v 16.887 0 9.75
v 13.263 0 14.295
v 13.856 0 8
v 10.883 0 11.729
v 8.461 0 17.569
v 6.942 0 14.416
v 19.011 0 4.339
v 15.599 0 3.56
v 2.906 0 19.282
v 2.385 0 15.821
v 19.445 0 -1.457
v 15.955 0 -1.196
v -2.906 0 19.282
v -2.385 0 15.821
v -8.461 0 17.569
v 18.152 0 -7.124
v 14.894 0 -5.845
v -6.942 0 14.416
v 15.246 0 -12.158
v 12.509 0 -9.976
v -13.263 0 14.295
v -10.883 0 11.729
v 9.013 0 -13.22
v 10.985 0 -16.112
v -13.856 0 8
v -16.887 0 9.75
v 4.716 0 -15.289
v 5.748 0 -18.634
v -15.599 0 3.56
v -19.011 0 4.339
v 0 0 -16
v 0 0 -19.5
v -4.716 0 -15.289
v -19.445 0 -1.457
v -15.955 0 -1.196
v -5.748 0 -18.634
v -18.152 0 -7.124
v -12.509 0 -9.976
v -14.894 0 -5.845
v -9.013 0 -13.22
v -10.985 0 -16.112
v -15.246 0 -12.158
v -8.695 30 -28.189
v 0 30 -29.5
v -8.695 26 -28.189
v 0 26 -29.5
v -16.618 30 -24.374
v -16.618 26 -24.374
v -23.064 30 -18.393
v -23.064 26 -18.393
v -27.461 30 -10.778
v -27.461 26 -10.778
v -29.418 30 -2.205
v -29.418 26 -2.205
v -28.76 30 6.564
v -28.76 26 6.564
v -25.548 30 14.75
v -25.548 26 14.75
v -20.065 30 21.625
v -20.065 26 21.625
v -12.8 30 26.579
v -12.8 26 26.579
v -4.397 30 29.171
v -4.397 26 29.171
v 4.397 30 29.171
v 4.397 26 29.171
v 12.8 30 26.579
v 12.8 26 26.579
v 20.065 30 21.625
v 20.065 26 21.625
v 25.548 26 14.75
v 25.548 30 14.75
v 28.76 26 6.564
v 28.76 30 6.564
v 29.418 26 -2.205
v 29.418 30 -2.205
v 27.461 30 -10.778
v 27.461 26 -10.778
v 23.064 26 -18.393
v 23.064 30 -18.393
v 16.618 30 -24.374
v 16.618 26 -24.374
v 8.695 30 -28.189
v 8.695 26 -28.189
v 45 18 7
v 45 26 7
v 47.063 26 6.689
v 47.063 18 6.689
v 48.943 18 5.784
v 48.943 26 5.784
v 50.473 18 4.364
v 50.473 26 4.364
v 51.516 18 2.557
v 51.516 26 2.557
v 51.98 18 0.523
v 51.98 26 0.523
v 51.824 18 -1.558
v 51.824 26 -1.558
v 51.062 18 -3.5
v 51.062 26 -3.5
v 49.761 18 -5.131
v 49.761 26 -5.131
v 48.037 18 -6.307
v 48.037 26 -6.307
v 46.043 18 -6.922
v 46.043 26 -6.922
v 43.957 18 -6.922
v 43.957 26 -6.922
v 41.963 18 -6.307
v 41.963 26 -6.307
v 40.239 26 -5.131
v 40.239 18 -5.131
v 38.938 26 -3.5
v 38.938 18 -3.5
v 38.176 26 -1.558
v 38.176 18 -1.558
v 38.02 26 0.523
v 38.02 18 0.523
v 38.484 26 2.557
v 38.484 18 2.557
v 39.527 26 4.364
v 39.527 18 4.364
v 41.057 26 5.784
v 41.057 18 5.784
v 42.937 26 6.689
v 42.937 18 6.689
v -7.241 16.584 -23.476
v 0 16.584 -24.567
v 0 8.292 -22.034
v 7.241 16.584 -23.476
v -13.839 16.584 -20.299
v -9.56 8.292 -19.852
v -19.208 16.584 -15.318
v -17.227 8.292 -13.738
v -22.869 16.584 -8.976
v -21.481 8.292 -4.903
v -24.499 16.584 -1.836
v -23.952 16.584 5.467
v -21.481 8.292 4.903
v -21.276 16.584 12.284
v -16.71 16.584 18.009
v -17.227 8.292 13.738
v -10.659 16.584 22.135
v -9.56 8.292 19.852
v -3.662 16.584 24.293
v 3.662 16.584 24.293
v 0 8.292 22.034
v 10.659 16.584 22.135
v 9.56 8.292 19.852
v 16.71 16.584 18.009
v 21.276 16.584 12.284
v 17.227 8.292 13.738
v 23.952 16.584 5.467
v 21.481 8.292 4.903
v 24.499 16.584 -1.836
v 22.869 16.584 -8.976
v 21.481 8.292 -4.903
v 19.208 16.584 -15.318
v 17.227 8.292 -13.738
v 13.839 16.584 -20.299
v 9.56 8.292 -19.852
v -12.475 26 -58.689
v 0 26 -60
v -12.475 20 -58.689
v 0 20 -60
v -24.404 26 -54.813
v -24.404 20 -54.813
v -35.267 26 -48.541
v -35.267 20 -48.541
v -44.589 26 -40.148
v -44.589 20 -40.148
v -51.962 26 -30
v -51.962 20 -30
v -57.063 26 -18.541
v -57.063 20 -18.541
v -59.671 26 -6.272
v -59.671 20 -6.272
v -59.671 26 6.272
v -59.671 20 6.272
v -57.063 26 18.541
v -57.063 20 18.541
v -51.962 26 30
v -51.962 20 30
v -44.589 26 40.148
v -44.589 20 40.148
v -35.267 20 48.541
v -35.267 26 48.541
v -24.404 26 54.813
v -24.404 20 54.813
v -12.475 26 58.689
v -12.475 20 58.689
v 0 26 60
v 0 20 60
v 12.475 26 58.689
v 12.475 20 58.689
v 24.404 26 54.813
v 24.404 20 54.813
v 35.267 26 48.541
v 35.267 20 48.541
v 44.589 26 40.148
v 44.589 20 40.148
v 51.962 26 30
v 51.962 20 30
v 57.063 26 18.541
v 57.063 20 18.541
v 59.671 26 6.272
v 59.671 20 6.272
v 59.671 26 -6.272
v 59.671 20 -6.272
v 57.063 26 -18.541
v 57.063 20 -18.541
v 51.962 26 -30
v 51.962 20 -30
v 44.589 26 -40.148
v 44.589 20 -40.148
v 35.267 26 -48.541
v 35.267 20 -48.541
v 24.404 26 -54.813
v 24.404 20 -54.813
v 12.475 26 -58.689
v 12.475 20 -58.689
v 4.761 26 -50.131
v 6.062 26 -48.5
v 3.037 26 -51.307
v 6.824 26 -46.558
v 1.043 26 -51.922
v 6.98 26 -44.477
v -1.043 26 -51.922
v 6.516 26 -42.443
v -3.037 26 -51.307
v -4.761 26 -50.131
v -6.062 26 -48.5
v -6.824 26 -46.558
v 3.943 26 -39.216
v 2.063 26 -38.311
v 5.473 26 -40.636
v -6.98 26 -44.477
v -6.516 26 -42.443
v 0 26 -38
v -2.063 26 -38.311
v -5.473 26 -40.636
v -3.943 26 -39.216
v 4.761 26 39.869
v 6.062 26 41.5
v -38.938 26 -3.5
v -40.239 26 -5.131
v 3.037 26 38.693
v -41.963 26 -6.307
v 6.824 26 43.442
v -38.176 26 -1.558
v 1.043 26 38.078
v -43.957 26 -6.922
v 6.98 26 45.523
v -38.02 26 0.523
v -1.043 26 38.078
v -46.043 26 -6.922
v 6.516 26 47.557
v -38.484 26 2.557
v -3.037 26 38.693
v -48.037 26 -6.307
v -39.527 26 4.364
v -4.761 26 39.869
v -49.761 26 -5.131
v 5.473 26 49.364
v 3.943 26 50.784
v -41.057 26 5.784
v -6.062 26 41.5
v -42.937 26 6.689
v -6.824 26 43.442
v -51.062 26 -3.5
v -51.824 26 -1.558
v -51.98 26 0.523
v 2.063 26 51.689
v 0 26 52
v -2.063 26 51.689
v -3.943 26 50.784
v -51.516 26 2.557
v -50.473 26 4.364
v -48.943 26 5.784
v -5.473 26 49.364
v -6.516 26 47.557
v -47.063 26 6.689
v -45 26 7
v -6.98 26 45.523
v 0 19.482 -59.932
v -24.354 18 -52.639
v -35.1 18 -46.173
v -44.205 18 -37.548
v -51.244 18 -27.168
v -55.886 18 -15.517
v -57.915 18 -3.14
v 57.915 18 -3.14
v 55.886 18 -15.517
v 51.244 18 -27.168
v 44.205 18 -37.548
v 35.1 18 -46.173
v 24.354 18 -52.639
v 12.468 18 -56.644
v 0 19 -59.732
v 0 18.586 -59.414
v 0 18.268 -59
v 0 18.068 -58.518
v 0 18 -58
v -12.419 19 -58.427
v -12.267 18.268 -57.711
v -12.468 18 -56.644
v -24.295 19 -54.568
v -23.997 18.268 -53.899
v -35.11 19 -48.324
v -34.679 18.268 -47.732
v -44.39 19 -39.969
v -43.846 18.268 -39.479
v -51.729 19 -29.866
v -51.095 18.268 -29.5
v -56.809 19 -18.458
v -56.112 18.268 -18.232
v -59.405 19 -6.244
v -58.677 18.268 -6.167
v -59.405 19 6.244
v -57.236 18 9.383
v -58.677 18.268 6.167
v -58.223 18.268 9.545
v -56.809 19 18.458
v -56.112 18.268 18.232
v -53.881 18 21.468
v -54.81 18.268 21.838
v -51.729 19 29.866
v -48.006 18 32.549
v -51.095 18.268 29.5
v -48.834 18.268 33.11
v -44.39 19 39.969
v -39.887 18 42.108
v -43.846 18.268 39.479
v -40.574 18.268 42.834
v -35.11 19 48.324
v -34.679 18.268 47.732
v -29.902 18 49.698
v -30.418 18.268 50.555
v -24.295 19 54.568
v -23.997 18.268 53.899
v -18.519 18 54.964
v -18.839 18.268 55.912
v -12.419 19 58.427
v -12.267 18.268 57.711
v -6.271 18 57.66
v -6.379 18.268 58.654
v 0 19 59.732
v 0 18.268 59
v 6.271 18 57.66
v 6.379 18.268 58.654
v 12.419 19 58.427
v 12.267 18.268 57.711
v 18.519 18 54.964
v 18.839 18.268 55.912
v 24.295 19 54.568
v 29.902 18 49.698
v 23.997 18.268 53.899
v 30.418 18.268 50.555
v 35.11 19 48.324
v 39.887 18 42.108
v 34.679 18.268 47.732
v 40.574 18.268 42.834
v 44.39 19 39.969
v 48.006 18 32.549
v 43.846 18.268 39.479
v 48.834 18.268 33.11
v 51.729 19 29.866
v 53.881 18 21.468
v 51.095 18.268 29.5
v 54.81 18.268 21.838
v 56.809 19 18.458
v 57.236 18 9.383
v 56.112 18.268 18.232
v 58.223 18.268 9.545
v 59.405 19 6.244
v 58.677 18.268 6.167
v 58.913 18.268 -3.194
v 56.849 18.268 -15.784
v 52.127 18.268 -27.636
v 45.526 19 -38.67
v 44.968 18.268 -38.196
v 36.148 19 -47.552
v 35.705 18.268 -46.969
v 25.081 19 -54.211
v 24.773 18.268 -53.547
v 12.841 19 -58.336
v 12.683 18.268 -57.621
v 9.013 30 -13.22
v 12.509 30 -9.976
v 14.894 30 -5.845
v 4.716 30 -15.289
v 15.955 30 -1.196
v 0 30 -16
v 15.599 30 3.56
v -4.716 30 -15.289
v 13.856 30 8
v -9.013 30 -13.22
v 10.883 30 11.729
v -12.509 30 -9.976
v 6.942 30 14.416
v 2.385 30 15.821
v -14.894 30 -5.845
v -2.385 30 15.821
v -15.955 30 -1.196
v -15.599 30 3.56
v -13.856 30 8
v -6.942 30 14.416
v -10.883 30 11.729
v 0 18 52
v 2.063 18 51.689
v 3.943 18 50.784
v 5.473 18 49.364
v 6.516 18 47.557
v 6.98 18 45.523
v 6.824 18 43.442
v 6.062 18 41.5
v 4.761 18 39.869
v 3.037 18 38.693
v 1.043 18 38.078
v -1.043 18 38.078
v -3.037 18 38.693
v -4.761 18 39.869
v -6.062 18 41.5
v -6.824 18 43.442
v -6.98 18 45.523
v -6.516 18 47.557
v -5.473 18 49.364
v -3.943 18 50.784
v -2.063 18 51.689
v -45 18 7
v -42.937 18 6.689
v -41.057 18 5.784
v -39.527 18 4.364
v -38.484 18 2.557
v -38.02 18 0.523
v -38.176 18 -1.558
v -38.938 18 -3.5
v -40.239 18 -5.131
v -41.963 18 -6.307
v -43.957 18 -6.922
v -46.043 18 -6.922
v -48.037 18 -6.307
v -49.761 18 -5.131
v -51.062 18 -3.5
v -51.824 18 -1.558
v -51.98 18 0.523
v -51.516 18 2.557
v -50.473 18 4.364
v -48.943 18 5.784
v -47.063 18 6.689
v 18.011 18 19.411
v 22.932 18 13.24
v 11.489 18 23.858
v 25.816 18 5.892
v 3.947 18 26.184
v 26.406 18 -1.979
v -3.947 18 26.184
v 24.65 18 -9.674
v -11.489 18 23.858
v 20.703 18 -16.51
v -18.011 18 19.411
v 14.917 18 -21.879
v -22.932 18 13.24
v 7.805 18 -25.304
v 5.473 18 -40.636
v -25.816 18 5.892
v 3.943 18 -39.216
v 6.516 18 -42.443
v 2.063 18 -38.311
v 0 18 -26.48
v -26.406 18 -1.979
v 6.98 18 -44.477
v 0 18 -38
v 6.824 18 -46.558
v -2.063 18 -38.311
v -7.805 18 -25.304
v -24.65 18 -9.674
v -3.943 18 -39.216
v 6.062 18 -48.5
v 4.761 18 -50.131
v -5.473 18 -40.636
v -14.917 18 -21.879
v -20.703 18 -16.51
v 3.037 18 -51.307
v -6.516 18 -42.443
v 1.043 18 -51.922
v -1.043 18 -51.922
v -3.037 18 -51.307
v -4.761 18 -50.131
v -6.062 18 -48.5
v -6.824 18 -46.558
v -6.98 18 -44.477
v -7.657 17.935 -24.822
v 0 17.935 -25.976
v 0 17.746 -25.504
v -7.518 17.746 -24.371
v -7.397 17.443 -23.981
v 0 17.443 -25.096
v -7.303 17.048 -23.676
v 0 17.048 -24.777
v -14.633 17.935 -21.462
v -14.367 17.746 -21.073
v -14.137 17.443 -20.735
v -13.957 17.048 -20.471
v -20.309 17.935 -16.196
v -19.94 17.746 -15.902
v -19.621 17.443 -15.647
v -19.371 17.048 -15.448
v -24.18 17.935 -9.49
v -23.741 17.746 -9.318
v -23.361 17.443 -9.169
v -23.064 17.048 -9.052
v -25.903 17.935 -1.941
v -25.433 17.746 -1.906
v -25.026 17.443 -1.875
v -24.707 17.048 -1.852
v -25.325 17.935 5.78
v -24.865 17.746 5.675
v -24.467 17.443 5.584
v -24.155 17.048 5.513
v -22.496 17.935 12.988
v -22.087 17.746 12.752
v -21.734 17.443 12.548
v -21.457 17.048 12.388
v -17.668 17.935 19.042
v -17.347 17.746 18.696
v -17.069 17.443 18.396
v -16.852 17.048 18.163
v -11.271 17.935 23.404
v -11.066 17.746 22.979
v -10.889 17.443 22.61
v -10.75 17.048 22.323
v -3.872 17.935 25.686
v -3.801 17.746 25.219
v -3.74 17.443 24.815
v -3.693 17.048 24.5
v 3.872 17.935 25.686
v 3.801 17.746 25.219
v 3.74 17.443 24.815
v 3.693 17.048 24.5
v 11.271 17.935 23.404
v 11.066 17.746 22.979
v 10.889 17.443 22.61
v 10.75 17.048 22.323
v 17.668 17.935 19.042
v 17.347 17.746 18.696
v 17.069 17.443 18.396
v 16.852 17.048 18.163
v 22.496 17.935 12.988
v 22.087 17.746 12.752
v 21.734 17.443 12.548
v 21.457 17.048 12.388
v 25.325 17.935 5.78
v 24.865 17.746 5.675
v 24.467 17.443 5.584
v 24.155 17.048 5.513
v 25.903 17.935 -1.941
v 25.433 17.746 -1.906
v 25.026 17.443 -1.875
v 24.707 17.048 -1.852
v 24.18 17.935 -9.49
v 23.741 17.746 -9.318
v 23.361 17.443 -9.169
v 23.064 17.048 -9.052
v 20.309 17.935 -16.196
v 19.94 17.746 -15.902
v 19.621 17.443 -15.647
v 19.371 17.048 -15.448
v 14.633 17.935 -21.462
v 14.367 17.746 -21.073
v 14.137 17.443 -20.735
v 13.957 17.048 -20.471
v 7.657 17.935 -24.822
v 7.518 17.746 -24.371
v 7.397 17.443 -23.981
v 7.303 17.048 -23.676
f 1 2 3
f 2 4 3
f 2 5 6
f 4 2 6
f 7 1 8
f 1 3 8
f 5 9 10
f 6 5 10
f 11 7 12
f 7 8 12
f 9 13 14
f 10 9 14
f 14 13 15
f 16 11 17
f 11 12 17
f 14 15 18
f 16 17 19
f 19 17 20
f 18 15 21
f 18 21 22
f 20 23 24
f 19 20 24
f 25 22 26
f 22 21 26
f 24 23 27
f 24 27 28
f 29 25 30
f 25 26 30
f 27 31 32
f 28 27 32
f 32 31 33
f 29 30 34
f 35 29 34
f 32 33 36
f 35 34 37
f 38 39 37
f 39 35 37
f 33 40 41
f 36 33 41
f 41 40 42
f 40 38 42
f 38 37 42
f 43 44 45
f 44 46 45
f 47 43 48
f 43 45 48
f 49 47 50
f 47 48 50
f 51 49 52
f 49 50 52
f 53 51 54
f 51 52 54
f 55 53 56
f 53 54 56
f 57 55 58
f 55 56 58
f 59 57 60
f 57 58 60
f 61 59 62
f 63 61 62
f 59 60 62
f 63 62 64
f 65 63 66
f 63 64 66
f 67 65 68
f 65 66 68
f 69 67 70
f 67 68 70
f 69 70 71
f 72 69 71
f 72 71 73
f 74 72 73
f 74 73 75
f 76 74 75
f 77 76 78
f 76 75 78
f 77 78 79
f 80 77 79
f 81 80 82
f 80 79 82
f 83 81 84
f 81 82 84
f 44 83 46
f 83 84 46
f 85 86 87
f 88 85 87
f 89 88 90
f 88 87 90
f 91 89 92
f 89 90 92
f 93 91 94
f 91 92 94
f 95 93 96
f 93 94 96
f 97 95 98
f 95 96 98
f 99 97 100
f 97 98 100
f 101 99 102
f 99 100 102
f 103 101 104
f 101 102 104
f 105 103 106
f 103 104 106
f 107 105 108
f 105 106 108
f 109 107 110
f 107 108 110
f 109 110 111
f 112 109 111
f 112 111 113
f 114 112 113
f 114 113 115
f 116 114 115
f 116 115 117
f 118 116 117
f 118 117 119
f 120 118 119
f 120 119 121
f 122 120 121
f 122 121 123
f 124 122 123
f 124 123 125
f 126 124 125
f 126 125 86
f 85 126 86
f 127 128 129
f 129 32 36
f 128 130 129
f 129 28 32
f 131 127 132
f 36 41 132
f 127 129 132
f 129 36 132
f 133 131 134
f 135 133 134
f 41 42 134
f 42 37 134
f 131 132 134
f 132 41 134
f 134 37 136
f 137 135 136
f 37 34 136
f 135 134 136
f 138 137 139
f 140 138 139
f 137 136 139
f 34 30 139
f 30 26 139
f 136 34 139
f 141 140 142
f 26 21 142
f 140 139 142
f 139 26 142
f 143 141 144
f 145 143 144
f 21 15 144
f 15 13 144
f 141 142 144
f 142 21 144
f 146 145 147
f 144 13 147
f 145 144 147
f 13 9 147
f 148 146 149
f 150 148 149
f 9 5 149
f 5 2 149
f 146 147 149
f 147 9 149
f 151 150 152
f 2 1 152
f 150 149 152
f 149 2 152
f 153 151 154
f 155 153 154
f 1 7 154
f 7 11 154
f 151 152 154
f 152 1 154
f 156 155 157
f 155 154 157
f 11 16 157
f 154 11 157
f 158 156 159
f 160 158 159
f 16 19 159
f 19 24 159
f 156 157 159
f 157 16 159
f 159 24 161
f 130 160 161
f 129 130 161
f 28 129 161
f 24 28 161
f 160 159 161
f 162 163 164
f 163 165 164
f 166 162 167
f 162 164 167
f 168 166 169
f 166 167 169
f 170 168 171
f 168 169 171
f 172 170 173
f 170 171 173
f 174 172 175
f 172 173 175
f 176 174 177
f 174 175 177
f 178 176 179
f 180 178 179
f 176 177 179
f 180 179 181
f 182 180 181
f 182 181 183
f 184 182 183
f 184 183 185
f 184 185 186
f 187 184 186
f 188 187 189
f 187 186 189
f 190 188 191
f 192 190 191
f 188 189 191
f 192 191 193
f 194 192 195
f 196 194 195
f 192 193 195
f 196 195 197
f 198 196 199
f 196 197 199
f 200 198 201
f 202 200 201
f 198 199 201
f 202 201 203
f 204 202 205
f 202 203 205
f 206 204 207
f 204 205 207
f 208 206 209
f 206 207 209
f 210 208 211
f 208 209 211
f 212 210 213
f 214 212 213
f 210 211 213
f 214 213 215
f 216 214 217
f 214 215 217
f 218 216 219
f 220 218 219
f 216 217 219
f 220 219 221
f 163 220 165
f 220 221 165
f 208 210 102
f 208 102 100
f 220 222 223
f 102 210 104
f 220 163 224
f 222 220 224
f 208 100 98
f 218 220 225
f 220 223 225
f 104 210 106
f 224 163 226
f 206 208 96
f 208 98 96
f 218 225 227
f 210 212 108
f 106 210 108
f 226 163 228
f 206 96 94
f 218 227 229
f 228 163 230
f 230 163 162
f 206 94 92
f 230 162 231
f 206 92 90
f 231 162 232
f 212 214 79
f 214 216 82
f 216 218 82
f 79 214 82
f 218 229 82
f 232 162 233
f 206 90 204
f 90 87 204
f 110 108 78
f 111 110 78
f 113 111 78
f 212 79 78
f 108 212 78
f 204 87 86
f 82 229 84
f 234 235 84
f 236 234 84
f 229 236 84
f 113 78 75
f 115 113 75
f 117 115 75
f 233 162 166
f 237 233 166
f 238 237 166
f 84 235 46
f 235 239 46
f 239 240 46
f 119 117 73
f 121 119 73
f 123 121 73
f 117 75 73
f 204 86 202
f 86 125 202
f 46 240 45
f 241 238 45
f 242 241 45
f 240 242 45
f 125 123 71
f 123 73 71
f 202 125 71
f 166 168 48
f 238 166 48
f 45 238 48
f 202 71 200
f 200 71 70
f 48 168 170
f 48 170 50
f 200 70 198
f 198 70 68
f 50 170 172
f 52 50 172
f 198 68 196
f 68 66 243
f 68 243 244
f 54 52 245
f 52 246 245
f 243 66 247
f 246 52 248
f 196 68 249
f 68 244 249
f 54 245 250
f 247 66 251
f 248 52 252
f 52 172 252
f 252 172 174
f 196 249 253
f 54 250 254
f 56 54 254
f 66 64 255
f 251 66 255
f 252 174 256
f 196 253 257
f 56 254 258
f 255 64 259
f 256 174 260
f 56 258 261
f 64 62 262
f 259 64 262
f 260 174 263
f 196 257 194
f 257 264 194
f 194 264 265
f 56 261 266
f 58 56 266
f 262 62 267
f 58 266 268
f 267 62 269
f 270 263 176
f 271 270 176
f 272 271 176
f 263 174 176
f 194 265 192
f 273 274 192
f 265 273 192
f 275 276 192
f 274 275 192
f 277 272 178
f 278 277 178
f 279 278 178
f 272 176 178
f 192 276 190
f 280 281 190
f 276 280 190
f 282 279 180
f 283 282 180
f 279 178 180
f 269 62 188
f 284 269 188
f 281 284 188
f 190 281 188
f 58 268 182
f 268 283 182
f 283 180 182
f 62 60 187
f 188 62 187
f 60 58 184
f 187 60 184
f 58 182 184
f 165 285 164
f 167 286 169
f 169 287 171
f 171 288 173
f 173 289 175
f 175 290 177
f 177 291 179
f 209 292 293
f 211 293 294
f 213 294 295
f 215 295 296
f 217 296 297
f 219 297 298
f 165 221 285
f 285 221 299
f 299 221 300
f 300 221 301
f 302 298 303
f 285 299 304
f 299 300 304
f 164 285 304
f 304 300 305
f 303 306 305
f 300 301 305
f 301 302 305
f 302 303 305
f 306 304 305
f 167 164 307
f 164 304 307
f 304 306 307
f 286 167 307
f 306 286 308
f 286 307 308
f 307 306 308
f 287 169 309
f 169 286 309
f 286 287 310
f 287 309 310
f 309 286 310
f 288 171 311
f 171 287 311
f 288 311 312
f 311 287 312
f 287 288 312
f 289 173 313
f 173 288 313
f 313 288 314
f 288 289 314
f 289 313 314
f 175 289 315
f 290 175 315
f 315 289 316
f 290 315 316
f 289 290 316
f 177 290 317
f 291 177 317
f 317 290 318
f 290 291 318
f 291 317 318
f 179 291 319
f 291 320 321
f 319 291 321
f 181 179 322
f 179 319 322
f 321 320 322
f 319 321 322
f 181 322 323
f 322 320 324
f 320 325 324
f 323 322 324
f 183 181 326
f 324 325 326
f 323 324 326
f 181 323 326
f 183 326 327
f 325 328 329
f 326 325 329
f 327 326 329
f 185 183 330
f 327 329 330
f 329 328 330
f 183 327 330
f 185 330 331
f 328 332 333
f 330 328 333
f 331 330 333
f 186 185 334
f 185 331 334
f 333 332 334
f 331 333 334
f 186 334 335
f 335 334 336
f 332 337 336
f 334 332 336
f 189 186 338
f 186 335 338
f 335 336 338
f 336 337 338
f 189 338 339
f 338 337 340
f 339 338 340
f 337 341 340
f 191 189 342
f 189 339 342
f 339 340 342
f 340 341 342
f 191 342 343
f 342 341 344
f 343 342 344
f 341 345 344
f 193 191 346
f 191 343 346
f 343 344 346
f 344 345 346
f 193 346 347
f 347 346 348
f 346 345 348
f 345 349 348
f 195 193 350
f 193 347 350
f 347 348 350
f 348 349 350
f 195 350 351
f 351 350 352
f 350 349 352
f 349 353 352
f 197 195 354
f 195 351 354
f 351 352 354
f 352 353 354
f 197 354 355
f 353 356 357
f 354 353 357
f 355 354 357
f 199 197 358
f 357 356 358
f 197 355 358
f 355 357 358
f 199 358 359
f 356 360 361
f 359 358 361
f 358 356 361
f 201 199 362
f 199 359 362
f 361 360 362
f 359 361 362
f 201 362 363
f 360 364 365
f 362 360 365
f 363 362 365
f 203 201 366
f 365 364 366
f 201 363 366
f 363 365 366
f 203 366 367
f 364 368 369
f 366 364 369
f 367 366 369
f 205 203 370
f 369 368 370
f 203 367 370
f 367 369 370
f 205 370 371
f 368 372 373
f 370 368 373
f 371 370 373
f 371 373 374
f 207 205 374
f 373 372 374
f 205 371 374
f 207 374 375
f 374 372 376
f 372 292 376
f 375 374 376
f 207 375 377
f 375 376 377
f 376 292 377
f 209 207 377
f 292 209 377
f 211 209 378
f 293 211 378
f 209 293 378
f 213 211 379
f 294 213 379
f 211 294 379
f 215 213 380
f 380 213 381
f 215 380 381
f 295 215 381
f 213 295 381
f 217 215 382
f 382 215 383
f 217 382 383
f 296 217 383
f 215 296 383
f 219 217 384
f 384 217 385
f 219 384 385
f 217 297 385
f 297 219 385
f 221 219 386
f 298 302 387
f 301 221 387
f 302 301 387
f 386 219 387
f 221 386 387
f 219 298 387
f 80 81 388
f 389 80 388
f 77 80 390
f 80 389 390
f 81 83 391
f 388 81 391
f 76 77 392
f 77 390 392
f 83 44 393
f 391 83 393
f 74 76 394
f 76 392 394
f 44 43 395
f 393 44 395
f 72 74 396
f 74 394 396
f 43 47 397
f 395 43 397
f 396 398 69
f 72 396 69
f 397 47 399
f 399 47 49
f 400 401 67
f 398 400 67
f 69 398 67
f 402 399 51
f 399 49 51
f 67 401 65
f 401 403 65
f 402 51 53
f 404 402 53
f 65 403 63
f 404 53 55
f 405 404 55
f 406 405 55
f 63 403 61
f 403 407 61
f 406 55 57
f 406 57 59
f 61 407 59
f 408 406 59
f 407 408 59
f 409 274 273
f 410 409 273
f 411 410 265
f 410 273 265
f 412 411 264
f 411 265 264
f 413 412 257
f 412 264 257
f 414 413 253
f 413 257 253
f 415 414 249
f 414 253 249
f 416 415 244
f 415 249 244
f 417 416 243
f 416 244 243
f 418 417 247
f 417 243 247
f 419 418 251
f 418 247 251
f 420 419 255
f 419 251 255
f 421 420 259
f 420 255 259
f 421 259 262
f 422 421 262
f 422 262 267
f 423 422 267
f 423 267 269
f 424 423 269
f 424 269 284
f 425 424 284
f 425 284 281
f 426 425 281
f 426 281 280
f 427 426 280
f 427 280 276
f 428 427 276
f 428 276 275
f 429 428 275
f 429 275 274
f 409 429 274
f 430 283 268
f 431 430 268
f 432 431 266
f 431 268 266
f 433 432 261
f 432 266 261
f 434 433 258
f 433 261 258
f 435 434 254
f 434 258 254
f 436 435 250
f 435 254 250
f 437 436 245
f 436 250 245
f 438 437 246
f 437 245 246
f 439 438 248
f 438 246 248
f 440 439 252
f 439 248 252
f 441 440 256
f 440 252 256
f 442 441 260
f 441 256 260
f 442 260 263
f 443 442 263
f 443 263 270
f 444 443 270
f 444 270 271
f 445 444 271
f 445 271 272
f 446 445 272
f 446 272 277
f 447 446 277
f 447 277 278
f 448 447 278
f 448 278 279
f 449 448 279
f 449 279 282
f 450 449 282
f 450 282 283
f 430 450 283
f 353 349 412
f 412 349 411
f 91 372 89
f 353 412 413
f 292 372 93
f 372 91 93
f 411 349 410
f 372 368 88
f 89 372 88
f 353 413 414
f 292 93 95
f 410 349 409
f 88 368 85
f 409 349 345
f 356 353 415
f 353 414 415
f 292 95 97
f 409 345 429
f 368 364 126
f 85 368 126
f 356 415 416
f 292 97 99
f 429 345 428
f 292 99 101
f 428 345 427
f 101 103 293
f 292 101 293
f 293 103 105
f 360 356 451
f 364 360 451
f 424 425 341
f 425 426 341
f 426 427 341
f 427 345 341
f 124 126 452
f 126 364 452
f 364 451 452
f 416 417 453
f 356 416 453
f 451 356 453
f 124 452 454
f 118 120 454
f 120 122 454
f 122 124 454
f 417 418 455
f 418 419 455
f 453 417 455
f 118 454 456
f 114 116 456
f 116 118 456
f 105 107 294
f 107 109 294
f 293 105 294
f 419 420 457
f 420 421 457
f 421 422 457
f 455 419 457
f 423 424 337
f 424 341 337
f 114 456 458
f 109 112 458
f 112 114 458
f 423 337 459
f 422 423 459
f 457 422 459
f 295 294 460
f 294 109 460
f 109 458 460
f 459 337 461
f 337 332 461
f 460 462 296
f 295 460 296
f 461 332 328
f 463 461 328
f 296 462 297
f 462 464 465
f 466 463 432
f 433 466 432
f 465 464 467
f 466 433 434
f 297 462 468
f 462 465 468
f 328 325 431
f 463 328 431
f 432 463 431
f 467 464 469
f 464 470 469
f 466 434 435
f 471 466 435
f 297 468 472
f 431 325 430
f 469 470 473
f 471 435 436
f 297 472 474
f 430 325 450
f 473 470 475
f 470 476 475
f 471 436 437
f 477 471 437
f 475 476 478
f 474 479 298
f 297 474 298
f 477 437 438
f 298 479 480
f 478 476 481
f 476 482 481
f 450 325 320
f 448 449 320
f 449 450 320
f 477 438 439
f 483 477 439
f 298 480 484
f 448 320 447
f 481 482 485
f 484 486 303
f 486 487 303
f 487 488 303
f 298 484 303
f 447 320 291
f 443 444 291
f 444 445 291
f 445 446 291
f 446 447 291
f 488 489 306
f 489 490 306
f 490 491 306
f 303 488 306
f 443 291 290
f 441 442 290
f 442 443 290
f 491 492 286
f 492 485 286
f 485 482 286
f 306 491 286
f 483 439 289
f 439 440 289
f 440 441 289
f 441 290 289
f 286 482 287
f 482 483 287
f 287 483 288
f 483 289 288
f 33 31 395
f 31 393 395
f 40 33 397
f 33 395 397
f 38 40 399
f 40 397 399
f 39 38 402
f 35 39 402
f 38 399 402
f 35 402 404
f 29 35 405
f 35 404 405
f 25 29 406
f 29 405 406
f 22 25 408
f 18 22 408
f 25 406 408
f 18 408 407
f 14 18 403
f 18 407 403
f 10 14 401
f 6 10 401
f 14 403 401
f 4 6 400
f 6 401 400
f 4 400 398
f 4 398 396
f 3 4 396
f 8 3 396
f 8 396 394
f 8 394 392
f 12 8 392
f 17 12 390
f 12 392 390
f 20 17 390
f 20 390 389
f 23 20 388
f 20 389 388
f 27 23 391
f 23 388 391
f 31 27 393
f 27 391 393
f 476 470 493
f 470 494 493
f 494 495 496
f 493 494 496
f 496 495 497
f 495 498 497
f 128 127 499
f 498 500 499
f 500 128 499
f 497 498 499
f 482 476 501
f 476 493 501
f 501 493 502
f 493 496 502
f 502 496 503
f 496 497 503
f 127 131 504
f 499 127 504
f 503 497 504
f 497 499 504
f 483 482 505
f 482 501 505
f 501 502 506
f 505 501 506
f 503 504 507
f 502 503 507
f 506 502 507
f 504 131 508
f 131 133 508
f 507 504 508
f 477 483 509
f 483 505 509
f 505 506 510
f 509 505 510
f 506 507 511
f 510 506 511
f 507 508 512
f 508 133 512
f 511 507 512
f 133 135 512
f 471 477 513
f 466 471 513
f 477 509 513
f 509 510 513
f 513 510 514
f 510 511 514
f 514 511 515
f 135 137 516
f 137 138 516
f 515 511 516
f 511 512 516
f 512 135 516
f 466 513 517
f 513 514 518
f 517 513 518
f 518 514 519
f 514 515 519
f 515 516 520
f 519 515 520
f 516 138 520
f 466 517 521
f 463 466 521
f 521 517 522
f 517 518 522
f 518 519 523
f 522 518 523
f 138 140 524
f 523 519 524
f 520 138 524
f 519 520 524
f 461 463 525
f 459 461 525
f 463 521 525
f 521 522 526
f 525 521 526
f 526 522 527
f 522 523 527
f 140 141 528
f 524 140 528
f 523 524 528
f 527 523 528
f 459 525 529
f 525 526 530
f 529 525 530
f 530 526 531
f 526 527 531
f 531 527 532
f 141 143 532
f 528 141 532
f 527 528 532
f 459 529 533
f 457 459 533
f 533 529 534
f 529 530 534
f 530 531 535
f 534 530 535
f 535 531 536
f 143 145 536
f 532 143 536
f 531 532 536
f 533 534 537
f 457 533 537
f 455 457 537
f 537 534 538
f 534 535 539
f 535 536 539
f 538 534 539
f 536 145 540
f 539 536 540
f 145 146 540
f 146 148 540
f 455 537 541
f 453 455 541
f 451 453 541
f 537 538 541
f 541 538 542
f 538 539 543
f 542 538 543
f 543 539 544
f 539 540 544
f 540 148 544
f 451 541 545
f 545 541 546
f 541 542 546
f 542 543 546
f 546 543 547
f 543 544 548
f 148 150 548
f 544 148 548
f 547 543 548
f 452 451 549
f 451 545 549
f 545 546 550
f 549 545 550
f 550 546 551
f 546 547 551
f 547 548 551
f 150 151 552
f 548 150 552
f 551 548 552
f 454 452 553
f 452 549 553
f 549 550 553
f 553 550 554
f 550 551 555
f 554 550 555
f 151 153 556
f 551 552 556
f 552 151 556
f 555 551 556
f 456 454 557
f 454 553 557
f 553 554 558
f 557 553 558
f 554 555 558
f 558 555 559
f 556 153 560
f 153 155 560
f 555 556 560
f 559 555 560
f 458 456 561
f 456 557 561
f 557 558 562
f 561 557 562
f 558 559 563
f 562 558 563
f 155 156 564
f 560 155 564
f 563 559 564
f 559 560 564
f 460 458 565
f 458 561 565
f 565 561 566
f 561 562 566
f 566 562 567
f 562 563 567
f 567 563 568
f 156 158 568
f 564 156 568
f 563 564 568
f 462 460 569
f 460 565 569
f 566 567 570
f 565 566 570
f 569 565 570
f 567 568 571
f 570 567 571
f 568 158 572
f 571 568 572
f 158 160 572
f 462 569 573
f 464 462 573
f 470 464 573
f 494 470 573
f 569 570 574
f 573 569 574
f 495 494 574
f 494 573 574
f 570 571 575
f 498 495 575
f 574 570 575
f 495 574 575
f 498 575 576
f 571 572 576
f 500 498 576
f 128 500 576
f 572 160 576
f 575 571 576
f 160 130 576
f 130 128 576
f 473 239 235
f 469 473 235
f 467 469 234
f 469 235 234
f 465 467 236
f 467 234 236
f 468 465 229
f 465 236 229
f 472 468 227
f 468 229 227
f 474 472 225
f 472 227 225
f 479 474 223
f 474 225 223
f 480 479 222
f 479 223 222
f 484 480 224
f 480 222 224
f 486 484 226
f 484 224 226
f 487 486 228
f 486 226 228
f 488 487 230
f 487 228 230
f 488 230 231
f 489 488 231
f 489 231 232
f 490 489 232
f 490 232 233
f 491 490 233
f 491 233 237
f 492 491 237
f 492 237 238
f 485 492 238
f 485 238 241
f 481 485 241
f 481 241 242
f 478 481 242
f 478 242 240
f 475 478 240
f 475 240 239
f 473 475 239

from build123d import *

# Parameters (mm, degrees)
SKETCH_2_R          = 7
CUT_EXTRUDE_1_DEPTH = 89.746830997


with BuildPart() as part:
    # Эскиз1 → Повернуть1 (revolve)
    with BuildSketch(Plane.XY, mode=Mode.PRIVATE) as revolve_1_sk:
        with BuildLine():
            Line((-16, 0), (-16, 30))
            Line((-16, 30), (-29.5, 30))
            Line((-29.5, 30), (-29.5, 26))
            Line((-29.5, 26), (-60, 26))
            Line((-60, 26), (-60, 20))
            ThreePointArc((-60, 20), (-59.414213562, 18.585786438), (-58, 18))
            Line((-58, 18), (-26.480170025, 18))
            ThreePointArc((-26.480170025, 18), (-25.290395707, 17.607618447), (-24.567466883, 16.584437071))
            Line((-24.567466883, 16.584437071), (-19.5, 0))
            Line((-19.5, 0), (-16, 0))
        make_face()
    revolve(revolve_1_sk.sketch.rotate(Axis((0, 0, 0), (0, 1, 0)), 270), axis=Axis((0, 0, 0), (0, 1, 0)))

    # Эскиз2 → Вырез-Вытянуть1 (cut, through all)
    with BuildSketch(Plane(origin=(0, 26, 0), x_dir=(1, 0, 0), z_dir=(0, 1, 0))):
        with Locations(Location((-45, 0, 0), (0, 0, 270))):
            Circle(SKETCH_2_R)
        with Locations(Location((0, 45, 0), (0, 0, 270))):
            Circle(SKETCH_2_R)
        with Locations(Location((45, 0, 0), (0, 0, 270))):
            Circle(SKETCH_2_R)
        with Locations(Location((0, -45, 0), (0, 0, 270))):
            Circle(SKETCH_2_R)
    extrude(amount=-CUT_EXTRUDE_1_DEPTH, mode=Mode.SUBTRACT)


solid = part.part
